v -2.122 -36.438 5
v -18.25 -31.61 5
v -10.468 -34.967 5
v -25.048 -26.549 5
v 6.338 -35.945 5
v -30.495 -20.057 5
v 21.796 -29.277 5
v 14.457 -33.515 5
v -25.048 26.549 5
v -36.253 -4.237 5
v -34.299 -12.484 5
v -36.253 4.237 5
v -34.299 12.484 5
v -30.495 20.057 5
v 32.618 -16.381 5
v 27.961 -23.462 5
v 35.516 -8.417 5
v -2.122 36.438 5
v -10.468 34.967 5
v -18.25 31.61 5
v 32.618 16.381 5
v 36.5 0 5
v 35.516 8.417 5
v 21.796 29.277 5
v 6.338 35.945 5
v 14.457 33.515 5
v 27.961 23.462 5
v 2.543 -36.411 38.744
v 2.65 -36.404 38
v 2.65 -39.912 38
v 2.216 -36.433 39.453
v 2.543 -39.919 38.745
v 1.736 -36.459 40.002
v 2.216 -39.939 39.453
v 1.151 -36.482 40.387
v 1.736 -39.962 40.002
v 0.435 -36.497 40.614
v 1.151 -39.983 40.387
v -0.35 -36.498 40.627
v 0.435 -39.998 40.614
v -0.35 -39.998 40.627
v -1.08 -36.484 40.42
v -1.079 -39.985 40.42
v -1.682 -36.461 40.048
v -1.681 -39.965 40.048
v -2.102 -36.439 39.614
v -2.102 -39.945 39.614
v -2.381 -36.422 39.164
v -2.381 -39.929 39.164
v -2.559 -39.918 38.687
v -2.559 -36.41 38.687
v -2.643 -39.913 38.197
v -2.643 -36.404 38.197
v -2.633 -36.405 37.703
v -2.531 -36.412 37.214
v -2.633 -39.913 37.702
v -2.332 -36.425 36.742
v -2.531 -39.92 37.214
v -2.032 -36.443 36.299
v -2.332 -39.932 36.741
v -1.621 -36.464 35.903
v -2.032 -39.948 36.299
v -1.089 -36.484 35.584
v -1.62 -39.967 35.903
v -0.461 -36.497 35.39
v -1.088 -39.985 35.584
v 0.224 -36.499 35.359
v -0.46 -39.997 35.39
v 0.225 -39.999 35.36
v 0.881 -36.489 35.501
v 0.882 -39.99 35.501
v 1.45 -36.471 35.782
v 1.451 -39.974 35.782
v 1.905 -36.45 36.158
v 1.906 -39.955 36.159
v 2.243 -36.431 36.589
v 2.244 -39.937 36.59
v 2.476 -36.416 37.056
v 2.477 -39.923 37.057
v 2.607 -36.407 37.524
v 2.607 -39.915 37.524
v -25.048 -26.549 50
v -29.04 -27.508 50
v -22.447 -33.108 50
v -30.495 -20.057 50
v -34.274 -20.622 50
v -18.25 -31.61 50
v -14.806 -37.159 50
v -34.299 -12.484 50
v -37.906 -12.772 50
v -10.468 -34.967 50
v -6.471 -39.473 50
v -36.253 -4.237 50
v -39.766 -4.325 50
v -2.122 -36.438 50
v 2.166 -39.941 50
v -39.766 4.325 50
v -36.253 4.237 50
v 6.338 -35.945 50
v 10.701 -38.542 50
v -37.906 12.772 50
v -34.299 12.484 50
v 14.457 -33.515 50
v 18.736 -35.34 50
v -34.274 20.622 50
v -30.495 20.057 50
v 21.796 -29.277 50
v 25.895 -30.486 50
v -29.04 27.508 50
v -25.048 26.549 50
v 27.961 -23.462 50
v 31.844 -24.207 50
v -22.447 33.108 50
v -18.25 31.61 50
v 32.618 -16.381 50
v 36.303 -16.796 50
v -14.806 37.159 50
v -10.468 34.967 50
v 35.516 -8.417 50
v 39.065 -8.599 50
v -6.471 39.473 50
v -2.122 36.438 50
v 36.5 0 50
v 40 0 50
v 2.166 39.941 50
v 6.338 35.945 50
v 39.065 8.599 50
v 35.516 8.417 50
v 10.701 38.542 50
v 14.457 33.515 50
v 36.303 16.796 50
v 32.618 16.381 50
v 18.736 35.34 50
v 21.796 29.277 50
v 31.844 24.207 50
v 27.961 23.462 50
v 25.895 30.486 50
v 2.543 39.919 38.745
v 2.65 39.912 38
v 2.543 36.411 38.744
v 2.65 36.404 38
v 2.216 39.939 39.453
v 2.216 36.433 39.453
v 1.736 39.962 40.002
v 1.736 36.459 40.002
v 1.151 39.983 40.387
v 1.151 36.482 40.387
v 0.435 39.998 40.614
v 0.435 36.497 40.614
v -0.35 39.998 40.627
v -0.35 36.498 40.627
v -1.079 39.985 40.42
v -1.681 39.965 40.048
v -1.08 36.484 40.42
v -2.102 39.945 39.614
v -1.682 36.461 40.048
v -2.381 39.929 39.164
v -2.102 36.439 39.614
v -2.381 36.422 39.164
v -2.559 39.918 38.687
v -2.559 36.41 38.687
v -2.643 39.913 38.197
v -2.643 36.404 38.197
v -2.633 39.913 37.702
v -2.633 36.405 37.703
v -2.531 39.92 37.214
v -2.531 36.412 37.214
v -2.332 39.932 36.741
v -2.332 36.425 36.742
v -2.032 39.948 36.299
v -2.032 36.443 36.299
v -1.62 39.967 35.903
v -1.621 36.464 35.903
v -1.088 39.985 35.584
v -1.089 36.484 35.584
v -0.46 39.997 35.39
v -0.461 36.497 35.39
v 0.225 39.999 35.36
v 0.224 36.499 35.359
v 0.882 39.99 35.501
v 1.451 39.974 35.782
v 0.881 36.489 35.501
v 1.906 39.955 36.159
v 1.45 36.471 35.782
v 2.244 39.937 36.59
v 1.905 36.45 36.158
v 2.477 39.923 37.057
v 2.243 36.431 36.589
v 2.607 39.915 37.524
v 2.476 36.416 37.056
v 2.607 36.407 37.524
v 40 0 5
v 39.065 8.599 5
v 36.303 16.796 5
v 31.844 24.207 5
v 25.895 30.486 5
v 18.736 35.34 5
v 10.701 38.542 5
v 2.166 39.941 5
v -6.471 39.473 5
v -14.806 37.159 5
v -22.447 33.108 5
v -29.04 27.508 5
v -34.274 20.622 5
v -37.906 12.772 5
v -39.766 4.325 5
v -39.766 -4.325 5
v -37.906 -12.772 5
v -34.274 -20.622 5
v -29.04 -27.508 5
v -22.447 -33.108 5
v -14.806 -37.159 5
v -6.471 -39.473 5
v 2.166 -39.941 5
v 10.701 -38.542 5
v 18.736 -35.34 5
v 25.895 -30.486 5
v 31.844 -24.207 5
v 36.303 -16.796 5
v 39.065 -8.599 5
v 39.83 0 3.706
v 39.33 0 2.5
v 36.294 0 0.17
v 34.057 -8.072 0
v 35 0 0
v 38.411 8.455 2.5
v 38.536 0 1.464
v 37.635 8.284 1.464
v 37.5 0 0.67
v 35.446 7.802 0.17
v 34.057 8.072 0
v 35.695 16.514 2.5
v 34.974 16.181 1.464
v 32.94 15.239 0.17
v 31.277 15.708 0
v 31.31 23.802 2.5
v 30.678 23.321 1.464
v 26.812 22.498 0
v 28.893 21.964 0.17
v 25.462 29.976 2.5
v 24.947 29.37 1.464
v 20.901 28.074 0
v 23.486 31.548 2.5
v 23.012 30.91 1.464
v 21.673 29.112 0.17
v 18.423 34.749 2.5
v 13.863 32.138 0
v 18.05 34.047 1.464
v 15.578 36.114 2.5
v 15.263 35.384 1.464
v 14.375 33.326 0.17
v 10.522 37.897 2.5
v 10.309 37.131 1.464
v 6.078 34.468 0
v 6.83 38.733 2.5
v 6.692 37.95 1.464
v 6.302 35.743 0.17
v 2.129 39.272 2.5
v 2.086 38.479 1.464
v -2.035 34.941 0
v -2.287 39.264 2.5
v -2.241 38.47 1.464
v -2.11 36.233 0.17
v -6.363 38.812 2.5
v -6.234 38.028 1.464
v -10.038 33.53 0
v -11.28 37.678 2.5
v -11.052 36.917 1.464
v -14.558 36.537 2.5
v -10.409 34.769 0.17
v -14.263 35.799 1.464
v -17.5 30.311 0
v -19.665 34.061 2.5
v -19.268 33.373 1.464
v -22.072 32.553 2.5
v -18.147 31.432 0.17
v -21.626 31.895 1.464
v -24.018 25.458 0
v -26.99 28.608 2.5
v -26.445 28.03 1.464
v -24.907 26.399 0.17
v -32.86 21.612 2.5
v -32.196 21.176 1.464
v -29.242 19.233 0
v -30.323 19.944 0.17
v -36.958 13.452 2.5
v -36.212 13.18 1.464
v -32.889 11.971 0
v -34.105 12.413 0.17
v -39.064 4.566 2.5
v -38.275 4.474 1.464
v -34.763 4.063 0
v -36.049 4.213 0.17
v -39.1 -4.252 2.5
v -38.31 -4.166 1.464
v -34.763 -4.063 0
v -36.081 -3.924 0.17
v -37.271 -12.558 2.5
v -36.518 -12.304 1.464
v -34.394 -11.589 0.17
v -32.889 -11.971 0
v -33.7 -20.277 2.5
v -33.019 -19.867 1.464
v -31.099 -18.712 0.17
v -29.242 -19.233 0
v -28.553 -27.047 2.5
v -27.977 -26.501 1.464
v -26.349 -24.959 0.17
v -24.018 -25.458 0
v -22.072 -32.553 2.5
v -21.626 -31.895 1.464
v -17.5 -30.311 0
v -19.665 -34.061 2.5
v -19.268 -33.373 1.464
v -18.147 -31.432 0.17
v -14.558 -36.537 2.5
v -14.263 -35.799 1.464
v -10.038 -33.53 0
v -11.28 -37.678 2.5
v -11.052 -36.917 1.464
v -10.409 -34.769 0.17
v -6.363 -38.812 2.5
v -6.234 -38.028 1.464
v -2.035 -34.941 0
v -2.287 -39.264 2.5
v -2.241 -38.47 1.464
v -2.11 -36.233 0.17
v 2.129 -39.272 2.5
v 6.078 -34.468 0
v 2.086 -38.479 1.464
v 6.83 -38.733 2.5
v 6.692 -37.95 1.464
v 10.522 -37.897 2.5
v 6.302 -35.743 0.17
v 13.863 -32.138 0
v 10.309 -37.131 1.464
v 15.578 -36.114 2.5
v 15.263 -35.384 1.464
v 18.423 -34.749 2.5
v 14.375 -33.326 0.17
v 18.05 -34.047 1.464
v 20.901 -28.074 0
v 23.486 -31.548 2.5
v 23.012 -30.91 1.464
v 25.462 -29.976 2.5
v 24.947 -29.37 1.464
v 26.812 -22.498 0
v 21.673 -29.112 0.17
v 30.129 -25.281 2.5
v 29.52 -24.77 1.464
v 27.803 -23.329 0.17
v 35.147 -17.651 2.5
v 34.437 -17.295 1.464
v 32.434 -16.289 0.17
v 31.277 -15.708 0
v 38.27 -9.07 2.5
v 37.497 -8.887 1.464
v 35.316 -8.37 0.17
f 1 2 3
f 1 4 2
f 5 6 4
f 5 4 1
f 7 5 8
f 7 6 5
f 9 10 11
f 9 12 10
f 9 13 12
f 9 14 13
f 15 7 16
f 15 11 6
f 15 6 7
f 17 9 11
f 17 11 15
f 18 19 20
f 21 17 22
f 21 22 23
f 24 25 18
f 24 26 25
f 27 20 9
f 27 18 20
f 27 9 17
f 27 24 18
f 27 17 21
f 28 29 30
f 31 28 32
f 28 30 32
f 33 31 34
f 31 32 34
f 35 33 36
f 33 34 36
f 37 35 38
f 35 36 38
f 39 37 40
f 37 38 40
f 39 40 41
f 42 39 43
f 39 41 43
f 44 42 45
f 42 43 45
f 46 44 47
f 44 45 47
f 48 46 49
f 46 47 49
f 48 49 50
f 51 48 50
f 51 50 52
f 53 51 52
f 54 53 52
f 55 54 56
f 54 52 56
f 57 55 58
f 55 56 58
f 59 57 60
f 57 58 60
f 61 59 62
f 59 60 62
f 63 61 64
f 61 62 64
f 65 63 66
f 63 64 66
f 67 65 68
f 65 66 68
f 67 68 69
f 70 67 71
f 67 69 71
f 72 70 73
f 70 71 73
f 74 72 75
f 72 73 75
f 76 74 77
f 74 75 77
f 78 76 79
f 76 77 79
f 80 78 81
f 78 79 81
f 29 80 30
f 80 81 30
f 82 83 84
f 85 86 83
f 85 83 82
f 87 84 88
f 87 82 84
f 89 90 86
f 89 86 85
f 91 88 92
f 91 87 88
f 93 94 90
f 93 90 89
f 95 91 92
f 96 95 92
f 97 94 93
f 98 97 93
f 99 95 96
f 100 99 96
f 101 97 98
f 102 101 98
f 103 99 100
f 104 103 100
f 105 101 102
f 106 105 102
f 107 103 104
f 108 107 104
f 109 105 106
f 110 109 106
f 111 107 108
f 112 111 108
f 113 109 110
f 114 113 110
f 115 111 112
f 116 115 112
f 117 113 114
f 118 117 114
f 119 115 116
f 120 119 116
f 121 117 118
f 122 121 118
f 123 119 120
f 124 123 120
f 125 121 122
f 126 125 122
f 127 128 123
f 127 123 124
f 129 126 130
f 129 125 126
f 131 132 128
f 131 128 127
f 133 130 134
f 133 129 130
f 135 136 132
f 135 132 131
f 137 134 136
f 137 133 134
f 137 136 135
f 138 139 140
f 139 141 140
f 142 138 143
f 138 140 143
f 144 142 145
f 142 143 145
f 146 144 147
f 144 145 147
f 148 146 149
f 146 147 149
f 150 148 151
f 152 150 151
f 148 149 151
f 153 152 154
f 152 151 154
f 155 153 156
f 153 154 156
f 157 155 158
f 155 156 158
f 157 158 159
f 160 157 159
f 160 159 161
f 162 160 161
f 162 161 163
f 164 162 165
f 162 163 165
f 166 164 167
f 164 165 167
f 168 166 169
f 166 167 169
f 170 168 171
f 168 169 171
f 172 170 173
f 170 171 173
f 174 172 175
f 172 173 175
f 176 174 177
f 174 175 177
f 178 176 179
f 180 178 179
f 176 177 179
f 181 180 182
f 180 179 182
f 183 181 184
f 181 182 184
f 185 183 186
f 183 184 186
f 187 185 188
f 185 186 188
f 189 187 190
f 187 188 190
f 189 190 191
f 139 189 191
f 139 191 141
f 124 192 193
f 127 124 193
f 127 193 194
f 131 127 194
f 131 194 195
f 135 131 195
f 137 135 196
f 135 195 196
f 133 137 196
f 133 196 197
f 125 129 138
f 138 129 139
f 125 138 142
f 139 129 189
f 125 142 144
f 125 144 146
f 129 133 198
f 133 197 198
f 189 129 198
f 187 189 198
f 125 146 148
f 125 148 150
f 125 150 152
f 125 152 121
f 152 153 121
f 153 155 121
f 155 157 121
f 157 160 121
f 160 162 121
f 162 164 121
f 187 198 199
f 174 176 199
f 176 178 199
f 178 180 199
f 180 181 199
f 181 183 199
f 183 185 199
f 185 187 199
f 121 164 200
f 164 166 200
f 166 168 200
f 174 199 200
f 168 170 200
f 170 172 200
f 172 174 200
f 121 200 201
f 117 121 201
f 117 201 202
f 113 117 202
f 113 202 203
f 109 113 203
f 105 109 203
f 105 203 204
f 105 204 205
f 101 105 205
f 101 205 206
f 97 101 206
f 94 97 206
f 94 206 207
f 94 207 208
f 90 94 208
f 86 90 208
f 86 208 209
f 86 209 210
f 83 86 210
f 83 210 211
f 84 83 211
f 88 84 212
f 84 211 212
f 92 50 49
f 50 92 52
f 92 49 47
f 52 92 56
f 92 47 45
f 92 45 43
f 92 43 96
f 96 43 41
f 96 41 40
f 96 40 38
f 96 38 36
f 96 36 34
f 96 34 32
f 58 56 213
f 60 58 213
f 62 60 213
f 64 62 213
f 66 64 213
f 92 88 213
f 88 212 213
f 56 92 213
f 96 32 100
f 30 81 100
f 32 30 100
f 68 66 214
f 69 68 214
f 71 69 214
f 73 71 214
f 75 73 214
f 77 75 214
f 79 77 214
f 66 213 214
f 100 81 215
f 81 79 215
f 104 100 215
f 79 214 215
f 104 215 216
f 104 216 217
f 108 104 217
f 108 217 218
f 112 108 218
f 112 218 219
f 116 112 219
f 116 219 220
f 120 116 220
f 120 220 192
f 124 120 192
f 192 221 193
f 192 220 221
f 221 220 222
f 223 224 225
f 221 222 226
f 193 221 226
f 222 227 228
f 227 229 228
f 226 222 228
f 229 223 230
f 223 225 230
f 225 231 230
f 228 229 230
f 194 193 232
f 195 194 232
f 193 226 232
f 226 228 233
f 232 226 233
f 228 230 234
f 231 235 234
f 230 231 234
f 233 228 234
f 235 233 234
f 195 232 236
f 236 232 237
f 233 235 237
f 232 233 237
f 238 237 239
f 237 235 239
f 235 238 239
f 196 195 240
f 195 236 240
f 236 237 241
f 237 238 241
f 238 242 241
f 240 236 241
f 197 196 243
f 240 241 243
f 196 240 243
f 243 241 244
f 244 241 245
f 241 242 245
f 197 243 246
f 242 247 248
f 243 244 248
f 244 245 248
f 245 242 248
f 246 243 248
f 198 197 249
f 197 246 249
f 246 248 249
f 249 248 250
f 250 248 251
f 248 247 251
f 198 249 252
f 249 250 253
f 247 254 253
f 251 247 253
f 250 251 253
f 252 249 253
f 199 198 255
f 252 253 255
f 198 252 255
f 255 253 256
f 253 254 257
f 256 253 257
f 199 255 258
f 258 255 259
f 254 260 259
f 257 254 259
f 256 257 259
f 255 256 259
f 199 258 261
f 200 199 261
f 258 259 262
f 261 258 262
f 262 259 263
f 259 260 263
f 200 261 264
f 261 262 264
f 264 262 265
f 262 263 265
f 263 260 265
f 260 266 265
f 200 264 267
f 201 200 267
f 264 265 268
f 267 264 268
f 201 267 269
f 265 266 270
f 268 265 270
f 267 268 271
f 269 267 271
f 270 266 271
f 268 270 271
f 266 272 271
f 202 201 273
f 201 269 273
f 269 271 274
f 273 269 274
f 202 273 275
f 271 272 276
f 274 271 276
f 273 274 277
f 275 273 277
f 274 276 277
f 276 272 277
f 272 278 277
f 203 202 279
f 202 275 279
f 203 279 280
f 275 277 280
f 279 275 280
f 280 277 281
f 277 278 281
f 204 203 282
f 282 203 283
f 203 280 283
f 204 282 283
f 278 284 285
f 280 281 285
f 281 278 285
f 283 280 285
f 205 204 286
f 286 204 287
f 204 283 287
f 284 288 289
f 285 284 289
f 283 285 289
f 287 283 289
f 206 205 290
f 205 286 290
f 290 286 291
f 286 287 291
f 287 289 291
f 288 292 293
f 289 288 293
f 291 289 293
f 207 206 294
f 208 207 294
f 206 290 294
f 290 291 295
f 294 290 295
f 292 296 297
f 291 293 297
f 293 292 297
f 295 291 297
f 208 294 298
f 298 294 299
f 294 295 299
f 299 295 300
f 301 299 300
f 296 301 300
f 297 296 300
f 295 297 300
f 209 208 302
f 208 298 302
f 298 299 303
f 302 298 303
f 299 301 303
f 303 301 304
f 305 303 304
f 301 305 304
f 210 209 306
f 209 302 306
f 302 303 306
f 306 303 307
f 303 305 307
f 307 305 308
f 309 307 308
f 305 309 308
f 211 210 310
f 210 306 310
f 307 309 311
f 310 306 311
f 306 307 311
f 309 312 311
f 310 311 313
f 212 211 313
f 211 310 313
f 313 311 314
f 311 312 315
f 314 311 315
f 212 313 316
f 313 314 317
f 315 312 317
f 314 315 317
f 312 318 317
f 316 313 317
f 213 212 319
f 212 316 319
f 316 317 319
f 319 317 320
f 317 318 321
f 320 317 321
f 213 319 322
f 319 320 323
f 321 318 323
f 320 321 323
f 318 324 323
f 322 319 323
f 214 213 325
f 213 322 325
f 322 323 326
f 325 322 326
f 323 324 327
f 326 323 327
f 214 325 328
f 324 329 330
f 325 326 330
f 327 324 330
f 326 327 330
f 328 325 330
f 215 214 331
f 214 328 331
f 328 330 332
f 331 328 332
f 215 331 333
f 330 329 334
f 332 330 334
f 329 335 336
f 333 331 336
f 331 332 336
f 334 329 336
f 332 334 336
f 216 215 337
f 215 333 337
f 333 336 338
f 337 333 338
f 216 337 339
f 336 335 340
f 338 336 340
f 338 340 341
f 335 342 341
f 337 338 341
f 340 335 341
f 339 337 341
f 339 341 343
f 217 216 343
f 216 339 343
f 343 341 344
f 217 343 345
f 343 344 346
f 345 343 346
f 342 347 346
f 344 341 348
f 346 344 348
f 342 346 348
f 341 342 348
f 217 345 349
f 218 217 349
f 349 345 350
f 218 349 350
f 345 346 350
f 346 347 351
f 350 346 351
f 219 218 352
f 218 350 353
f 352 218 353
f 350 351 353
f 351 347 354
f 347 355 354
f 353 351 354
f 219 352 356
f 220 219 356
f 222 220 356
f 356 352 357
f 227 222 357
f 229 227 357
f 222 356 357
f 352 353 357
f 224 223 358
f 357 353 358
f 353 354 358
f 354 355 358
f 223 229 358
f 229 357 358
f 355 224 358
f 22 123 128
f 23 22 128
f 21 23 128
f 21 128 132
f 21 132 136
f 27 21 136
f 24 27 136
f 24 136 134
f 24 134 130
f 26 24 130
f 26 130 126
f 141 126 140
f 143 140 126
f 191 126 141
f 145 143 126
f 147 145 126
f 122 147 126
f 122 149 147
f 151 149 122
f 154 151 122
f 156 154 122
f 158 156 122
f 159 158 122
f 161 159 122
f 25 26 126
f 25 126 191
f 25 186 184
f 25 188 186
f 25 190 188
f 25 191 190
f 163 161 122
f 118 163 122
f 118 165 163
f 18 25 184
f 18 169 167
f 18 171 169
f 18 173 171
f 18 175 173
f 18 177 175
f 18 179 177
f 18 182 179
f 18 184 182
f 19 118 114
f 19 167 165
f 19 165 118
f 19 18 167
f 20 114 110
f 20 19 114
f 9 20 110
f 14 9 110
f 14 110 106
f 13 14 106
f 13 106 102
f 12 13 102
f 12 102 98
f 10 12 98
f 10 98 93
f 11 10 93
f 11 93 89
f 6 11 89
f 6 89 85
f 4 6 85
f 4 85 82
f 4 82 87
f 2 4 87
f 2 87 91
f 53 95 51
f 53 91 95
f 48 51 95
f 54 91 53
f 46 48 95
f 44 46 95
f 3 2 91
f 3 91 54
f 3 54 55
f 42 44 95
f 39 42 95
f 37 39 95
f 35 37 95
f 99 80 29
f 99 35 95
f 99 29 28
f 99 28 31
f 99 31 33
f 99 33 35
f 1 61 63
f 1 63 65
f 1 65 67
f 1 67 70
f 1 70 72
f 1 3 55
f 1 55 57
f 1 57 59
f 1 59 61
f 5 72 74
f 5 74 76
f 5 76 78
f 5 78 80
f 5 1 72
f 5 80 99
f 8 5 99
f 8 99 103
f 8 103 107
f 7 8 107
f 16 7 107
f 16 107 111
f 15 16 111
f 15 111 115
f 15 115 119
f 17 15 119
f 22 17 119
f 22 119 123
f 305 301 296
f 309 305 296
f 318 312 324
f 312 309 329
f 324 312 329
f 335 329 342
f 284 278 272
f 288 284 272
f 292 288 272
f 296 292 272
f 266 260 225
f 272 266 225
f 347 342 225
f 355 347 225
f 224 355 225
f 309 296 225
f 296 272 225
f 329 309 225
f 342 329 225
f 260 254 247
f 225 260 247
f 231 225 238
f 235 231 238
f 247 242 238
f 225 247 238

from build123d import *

# Parameters (mm, degrees)
F0_R     = 40
F0_R_2   = 36.5
F1_DEPTH = 5
F2_DEPTH = 50
F3_R     = 2.65
F4_DEPTH = 75
F5_R     = 5


with BuildPart() as f1:
    # F0 (on Top) → F1 (new body)
    with BuildSketch(Plane.XY):
        Circle(F0_R)
        Circle(F0_R_2, mode=Mode.SUBTRACT)
        Circle(F0_R_2)
    extrude(amount=F1_DEPTH)

    # F0 (on Top) → F2 (join)
    with BuildSketch(Plane.XY):
        Circle(F0_R)
        Circle(F0_R_2, mode=Mode.SUBTRACT)
    extrude(amount=F2_DEPTH)

    # F3 (on Front) → F4 (cut, symmetric)
    with BuildSketch(Plane.XZ):
        with Locations((0, 38)):
            Circle(F3_R)
    extrude(amount=F4_DEPTH, both=True, mode=Mode.SUBTRACT)

    # F5
    f5_edges = [f1.edges().sort_by_distance(p)[0] for p in [
        (-40, 0, 0),
    ]]
    fillet(f5_edges, radius=F5_R)


solid = f1.part
